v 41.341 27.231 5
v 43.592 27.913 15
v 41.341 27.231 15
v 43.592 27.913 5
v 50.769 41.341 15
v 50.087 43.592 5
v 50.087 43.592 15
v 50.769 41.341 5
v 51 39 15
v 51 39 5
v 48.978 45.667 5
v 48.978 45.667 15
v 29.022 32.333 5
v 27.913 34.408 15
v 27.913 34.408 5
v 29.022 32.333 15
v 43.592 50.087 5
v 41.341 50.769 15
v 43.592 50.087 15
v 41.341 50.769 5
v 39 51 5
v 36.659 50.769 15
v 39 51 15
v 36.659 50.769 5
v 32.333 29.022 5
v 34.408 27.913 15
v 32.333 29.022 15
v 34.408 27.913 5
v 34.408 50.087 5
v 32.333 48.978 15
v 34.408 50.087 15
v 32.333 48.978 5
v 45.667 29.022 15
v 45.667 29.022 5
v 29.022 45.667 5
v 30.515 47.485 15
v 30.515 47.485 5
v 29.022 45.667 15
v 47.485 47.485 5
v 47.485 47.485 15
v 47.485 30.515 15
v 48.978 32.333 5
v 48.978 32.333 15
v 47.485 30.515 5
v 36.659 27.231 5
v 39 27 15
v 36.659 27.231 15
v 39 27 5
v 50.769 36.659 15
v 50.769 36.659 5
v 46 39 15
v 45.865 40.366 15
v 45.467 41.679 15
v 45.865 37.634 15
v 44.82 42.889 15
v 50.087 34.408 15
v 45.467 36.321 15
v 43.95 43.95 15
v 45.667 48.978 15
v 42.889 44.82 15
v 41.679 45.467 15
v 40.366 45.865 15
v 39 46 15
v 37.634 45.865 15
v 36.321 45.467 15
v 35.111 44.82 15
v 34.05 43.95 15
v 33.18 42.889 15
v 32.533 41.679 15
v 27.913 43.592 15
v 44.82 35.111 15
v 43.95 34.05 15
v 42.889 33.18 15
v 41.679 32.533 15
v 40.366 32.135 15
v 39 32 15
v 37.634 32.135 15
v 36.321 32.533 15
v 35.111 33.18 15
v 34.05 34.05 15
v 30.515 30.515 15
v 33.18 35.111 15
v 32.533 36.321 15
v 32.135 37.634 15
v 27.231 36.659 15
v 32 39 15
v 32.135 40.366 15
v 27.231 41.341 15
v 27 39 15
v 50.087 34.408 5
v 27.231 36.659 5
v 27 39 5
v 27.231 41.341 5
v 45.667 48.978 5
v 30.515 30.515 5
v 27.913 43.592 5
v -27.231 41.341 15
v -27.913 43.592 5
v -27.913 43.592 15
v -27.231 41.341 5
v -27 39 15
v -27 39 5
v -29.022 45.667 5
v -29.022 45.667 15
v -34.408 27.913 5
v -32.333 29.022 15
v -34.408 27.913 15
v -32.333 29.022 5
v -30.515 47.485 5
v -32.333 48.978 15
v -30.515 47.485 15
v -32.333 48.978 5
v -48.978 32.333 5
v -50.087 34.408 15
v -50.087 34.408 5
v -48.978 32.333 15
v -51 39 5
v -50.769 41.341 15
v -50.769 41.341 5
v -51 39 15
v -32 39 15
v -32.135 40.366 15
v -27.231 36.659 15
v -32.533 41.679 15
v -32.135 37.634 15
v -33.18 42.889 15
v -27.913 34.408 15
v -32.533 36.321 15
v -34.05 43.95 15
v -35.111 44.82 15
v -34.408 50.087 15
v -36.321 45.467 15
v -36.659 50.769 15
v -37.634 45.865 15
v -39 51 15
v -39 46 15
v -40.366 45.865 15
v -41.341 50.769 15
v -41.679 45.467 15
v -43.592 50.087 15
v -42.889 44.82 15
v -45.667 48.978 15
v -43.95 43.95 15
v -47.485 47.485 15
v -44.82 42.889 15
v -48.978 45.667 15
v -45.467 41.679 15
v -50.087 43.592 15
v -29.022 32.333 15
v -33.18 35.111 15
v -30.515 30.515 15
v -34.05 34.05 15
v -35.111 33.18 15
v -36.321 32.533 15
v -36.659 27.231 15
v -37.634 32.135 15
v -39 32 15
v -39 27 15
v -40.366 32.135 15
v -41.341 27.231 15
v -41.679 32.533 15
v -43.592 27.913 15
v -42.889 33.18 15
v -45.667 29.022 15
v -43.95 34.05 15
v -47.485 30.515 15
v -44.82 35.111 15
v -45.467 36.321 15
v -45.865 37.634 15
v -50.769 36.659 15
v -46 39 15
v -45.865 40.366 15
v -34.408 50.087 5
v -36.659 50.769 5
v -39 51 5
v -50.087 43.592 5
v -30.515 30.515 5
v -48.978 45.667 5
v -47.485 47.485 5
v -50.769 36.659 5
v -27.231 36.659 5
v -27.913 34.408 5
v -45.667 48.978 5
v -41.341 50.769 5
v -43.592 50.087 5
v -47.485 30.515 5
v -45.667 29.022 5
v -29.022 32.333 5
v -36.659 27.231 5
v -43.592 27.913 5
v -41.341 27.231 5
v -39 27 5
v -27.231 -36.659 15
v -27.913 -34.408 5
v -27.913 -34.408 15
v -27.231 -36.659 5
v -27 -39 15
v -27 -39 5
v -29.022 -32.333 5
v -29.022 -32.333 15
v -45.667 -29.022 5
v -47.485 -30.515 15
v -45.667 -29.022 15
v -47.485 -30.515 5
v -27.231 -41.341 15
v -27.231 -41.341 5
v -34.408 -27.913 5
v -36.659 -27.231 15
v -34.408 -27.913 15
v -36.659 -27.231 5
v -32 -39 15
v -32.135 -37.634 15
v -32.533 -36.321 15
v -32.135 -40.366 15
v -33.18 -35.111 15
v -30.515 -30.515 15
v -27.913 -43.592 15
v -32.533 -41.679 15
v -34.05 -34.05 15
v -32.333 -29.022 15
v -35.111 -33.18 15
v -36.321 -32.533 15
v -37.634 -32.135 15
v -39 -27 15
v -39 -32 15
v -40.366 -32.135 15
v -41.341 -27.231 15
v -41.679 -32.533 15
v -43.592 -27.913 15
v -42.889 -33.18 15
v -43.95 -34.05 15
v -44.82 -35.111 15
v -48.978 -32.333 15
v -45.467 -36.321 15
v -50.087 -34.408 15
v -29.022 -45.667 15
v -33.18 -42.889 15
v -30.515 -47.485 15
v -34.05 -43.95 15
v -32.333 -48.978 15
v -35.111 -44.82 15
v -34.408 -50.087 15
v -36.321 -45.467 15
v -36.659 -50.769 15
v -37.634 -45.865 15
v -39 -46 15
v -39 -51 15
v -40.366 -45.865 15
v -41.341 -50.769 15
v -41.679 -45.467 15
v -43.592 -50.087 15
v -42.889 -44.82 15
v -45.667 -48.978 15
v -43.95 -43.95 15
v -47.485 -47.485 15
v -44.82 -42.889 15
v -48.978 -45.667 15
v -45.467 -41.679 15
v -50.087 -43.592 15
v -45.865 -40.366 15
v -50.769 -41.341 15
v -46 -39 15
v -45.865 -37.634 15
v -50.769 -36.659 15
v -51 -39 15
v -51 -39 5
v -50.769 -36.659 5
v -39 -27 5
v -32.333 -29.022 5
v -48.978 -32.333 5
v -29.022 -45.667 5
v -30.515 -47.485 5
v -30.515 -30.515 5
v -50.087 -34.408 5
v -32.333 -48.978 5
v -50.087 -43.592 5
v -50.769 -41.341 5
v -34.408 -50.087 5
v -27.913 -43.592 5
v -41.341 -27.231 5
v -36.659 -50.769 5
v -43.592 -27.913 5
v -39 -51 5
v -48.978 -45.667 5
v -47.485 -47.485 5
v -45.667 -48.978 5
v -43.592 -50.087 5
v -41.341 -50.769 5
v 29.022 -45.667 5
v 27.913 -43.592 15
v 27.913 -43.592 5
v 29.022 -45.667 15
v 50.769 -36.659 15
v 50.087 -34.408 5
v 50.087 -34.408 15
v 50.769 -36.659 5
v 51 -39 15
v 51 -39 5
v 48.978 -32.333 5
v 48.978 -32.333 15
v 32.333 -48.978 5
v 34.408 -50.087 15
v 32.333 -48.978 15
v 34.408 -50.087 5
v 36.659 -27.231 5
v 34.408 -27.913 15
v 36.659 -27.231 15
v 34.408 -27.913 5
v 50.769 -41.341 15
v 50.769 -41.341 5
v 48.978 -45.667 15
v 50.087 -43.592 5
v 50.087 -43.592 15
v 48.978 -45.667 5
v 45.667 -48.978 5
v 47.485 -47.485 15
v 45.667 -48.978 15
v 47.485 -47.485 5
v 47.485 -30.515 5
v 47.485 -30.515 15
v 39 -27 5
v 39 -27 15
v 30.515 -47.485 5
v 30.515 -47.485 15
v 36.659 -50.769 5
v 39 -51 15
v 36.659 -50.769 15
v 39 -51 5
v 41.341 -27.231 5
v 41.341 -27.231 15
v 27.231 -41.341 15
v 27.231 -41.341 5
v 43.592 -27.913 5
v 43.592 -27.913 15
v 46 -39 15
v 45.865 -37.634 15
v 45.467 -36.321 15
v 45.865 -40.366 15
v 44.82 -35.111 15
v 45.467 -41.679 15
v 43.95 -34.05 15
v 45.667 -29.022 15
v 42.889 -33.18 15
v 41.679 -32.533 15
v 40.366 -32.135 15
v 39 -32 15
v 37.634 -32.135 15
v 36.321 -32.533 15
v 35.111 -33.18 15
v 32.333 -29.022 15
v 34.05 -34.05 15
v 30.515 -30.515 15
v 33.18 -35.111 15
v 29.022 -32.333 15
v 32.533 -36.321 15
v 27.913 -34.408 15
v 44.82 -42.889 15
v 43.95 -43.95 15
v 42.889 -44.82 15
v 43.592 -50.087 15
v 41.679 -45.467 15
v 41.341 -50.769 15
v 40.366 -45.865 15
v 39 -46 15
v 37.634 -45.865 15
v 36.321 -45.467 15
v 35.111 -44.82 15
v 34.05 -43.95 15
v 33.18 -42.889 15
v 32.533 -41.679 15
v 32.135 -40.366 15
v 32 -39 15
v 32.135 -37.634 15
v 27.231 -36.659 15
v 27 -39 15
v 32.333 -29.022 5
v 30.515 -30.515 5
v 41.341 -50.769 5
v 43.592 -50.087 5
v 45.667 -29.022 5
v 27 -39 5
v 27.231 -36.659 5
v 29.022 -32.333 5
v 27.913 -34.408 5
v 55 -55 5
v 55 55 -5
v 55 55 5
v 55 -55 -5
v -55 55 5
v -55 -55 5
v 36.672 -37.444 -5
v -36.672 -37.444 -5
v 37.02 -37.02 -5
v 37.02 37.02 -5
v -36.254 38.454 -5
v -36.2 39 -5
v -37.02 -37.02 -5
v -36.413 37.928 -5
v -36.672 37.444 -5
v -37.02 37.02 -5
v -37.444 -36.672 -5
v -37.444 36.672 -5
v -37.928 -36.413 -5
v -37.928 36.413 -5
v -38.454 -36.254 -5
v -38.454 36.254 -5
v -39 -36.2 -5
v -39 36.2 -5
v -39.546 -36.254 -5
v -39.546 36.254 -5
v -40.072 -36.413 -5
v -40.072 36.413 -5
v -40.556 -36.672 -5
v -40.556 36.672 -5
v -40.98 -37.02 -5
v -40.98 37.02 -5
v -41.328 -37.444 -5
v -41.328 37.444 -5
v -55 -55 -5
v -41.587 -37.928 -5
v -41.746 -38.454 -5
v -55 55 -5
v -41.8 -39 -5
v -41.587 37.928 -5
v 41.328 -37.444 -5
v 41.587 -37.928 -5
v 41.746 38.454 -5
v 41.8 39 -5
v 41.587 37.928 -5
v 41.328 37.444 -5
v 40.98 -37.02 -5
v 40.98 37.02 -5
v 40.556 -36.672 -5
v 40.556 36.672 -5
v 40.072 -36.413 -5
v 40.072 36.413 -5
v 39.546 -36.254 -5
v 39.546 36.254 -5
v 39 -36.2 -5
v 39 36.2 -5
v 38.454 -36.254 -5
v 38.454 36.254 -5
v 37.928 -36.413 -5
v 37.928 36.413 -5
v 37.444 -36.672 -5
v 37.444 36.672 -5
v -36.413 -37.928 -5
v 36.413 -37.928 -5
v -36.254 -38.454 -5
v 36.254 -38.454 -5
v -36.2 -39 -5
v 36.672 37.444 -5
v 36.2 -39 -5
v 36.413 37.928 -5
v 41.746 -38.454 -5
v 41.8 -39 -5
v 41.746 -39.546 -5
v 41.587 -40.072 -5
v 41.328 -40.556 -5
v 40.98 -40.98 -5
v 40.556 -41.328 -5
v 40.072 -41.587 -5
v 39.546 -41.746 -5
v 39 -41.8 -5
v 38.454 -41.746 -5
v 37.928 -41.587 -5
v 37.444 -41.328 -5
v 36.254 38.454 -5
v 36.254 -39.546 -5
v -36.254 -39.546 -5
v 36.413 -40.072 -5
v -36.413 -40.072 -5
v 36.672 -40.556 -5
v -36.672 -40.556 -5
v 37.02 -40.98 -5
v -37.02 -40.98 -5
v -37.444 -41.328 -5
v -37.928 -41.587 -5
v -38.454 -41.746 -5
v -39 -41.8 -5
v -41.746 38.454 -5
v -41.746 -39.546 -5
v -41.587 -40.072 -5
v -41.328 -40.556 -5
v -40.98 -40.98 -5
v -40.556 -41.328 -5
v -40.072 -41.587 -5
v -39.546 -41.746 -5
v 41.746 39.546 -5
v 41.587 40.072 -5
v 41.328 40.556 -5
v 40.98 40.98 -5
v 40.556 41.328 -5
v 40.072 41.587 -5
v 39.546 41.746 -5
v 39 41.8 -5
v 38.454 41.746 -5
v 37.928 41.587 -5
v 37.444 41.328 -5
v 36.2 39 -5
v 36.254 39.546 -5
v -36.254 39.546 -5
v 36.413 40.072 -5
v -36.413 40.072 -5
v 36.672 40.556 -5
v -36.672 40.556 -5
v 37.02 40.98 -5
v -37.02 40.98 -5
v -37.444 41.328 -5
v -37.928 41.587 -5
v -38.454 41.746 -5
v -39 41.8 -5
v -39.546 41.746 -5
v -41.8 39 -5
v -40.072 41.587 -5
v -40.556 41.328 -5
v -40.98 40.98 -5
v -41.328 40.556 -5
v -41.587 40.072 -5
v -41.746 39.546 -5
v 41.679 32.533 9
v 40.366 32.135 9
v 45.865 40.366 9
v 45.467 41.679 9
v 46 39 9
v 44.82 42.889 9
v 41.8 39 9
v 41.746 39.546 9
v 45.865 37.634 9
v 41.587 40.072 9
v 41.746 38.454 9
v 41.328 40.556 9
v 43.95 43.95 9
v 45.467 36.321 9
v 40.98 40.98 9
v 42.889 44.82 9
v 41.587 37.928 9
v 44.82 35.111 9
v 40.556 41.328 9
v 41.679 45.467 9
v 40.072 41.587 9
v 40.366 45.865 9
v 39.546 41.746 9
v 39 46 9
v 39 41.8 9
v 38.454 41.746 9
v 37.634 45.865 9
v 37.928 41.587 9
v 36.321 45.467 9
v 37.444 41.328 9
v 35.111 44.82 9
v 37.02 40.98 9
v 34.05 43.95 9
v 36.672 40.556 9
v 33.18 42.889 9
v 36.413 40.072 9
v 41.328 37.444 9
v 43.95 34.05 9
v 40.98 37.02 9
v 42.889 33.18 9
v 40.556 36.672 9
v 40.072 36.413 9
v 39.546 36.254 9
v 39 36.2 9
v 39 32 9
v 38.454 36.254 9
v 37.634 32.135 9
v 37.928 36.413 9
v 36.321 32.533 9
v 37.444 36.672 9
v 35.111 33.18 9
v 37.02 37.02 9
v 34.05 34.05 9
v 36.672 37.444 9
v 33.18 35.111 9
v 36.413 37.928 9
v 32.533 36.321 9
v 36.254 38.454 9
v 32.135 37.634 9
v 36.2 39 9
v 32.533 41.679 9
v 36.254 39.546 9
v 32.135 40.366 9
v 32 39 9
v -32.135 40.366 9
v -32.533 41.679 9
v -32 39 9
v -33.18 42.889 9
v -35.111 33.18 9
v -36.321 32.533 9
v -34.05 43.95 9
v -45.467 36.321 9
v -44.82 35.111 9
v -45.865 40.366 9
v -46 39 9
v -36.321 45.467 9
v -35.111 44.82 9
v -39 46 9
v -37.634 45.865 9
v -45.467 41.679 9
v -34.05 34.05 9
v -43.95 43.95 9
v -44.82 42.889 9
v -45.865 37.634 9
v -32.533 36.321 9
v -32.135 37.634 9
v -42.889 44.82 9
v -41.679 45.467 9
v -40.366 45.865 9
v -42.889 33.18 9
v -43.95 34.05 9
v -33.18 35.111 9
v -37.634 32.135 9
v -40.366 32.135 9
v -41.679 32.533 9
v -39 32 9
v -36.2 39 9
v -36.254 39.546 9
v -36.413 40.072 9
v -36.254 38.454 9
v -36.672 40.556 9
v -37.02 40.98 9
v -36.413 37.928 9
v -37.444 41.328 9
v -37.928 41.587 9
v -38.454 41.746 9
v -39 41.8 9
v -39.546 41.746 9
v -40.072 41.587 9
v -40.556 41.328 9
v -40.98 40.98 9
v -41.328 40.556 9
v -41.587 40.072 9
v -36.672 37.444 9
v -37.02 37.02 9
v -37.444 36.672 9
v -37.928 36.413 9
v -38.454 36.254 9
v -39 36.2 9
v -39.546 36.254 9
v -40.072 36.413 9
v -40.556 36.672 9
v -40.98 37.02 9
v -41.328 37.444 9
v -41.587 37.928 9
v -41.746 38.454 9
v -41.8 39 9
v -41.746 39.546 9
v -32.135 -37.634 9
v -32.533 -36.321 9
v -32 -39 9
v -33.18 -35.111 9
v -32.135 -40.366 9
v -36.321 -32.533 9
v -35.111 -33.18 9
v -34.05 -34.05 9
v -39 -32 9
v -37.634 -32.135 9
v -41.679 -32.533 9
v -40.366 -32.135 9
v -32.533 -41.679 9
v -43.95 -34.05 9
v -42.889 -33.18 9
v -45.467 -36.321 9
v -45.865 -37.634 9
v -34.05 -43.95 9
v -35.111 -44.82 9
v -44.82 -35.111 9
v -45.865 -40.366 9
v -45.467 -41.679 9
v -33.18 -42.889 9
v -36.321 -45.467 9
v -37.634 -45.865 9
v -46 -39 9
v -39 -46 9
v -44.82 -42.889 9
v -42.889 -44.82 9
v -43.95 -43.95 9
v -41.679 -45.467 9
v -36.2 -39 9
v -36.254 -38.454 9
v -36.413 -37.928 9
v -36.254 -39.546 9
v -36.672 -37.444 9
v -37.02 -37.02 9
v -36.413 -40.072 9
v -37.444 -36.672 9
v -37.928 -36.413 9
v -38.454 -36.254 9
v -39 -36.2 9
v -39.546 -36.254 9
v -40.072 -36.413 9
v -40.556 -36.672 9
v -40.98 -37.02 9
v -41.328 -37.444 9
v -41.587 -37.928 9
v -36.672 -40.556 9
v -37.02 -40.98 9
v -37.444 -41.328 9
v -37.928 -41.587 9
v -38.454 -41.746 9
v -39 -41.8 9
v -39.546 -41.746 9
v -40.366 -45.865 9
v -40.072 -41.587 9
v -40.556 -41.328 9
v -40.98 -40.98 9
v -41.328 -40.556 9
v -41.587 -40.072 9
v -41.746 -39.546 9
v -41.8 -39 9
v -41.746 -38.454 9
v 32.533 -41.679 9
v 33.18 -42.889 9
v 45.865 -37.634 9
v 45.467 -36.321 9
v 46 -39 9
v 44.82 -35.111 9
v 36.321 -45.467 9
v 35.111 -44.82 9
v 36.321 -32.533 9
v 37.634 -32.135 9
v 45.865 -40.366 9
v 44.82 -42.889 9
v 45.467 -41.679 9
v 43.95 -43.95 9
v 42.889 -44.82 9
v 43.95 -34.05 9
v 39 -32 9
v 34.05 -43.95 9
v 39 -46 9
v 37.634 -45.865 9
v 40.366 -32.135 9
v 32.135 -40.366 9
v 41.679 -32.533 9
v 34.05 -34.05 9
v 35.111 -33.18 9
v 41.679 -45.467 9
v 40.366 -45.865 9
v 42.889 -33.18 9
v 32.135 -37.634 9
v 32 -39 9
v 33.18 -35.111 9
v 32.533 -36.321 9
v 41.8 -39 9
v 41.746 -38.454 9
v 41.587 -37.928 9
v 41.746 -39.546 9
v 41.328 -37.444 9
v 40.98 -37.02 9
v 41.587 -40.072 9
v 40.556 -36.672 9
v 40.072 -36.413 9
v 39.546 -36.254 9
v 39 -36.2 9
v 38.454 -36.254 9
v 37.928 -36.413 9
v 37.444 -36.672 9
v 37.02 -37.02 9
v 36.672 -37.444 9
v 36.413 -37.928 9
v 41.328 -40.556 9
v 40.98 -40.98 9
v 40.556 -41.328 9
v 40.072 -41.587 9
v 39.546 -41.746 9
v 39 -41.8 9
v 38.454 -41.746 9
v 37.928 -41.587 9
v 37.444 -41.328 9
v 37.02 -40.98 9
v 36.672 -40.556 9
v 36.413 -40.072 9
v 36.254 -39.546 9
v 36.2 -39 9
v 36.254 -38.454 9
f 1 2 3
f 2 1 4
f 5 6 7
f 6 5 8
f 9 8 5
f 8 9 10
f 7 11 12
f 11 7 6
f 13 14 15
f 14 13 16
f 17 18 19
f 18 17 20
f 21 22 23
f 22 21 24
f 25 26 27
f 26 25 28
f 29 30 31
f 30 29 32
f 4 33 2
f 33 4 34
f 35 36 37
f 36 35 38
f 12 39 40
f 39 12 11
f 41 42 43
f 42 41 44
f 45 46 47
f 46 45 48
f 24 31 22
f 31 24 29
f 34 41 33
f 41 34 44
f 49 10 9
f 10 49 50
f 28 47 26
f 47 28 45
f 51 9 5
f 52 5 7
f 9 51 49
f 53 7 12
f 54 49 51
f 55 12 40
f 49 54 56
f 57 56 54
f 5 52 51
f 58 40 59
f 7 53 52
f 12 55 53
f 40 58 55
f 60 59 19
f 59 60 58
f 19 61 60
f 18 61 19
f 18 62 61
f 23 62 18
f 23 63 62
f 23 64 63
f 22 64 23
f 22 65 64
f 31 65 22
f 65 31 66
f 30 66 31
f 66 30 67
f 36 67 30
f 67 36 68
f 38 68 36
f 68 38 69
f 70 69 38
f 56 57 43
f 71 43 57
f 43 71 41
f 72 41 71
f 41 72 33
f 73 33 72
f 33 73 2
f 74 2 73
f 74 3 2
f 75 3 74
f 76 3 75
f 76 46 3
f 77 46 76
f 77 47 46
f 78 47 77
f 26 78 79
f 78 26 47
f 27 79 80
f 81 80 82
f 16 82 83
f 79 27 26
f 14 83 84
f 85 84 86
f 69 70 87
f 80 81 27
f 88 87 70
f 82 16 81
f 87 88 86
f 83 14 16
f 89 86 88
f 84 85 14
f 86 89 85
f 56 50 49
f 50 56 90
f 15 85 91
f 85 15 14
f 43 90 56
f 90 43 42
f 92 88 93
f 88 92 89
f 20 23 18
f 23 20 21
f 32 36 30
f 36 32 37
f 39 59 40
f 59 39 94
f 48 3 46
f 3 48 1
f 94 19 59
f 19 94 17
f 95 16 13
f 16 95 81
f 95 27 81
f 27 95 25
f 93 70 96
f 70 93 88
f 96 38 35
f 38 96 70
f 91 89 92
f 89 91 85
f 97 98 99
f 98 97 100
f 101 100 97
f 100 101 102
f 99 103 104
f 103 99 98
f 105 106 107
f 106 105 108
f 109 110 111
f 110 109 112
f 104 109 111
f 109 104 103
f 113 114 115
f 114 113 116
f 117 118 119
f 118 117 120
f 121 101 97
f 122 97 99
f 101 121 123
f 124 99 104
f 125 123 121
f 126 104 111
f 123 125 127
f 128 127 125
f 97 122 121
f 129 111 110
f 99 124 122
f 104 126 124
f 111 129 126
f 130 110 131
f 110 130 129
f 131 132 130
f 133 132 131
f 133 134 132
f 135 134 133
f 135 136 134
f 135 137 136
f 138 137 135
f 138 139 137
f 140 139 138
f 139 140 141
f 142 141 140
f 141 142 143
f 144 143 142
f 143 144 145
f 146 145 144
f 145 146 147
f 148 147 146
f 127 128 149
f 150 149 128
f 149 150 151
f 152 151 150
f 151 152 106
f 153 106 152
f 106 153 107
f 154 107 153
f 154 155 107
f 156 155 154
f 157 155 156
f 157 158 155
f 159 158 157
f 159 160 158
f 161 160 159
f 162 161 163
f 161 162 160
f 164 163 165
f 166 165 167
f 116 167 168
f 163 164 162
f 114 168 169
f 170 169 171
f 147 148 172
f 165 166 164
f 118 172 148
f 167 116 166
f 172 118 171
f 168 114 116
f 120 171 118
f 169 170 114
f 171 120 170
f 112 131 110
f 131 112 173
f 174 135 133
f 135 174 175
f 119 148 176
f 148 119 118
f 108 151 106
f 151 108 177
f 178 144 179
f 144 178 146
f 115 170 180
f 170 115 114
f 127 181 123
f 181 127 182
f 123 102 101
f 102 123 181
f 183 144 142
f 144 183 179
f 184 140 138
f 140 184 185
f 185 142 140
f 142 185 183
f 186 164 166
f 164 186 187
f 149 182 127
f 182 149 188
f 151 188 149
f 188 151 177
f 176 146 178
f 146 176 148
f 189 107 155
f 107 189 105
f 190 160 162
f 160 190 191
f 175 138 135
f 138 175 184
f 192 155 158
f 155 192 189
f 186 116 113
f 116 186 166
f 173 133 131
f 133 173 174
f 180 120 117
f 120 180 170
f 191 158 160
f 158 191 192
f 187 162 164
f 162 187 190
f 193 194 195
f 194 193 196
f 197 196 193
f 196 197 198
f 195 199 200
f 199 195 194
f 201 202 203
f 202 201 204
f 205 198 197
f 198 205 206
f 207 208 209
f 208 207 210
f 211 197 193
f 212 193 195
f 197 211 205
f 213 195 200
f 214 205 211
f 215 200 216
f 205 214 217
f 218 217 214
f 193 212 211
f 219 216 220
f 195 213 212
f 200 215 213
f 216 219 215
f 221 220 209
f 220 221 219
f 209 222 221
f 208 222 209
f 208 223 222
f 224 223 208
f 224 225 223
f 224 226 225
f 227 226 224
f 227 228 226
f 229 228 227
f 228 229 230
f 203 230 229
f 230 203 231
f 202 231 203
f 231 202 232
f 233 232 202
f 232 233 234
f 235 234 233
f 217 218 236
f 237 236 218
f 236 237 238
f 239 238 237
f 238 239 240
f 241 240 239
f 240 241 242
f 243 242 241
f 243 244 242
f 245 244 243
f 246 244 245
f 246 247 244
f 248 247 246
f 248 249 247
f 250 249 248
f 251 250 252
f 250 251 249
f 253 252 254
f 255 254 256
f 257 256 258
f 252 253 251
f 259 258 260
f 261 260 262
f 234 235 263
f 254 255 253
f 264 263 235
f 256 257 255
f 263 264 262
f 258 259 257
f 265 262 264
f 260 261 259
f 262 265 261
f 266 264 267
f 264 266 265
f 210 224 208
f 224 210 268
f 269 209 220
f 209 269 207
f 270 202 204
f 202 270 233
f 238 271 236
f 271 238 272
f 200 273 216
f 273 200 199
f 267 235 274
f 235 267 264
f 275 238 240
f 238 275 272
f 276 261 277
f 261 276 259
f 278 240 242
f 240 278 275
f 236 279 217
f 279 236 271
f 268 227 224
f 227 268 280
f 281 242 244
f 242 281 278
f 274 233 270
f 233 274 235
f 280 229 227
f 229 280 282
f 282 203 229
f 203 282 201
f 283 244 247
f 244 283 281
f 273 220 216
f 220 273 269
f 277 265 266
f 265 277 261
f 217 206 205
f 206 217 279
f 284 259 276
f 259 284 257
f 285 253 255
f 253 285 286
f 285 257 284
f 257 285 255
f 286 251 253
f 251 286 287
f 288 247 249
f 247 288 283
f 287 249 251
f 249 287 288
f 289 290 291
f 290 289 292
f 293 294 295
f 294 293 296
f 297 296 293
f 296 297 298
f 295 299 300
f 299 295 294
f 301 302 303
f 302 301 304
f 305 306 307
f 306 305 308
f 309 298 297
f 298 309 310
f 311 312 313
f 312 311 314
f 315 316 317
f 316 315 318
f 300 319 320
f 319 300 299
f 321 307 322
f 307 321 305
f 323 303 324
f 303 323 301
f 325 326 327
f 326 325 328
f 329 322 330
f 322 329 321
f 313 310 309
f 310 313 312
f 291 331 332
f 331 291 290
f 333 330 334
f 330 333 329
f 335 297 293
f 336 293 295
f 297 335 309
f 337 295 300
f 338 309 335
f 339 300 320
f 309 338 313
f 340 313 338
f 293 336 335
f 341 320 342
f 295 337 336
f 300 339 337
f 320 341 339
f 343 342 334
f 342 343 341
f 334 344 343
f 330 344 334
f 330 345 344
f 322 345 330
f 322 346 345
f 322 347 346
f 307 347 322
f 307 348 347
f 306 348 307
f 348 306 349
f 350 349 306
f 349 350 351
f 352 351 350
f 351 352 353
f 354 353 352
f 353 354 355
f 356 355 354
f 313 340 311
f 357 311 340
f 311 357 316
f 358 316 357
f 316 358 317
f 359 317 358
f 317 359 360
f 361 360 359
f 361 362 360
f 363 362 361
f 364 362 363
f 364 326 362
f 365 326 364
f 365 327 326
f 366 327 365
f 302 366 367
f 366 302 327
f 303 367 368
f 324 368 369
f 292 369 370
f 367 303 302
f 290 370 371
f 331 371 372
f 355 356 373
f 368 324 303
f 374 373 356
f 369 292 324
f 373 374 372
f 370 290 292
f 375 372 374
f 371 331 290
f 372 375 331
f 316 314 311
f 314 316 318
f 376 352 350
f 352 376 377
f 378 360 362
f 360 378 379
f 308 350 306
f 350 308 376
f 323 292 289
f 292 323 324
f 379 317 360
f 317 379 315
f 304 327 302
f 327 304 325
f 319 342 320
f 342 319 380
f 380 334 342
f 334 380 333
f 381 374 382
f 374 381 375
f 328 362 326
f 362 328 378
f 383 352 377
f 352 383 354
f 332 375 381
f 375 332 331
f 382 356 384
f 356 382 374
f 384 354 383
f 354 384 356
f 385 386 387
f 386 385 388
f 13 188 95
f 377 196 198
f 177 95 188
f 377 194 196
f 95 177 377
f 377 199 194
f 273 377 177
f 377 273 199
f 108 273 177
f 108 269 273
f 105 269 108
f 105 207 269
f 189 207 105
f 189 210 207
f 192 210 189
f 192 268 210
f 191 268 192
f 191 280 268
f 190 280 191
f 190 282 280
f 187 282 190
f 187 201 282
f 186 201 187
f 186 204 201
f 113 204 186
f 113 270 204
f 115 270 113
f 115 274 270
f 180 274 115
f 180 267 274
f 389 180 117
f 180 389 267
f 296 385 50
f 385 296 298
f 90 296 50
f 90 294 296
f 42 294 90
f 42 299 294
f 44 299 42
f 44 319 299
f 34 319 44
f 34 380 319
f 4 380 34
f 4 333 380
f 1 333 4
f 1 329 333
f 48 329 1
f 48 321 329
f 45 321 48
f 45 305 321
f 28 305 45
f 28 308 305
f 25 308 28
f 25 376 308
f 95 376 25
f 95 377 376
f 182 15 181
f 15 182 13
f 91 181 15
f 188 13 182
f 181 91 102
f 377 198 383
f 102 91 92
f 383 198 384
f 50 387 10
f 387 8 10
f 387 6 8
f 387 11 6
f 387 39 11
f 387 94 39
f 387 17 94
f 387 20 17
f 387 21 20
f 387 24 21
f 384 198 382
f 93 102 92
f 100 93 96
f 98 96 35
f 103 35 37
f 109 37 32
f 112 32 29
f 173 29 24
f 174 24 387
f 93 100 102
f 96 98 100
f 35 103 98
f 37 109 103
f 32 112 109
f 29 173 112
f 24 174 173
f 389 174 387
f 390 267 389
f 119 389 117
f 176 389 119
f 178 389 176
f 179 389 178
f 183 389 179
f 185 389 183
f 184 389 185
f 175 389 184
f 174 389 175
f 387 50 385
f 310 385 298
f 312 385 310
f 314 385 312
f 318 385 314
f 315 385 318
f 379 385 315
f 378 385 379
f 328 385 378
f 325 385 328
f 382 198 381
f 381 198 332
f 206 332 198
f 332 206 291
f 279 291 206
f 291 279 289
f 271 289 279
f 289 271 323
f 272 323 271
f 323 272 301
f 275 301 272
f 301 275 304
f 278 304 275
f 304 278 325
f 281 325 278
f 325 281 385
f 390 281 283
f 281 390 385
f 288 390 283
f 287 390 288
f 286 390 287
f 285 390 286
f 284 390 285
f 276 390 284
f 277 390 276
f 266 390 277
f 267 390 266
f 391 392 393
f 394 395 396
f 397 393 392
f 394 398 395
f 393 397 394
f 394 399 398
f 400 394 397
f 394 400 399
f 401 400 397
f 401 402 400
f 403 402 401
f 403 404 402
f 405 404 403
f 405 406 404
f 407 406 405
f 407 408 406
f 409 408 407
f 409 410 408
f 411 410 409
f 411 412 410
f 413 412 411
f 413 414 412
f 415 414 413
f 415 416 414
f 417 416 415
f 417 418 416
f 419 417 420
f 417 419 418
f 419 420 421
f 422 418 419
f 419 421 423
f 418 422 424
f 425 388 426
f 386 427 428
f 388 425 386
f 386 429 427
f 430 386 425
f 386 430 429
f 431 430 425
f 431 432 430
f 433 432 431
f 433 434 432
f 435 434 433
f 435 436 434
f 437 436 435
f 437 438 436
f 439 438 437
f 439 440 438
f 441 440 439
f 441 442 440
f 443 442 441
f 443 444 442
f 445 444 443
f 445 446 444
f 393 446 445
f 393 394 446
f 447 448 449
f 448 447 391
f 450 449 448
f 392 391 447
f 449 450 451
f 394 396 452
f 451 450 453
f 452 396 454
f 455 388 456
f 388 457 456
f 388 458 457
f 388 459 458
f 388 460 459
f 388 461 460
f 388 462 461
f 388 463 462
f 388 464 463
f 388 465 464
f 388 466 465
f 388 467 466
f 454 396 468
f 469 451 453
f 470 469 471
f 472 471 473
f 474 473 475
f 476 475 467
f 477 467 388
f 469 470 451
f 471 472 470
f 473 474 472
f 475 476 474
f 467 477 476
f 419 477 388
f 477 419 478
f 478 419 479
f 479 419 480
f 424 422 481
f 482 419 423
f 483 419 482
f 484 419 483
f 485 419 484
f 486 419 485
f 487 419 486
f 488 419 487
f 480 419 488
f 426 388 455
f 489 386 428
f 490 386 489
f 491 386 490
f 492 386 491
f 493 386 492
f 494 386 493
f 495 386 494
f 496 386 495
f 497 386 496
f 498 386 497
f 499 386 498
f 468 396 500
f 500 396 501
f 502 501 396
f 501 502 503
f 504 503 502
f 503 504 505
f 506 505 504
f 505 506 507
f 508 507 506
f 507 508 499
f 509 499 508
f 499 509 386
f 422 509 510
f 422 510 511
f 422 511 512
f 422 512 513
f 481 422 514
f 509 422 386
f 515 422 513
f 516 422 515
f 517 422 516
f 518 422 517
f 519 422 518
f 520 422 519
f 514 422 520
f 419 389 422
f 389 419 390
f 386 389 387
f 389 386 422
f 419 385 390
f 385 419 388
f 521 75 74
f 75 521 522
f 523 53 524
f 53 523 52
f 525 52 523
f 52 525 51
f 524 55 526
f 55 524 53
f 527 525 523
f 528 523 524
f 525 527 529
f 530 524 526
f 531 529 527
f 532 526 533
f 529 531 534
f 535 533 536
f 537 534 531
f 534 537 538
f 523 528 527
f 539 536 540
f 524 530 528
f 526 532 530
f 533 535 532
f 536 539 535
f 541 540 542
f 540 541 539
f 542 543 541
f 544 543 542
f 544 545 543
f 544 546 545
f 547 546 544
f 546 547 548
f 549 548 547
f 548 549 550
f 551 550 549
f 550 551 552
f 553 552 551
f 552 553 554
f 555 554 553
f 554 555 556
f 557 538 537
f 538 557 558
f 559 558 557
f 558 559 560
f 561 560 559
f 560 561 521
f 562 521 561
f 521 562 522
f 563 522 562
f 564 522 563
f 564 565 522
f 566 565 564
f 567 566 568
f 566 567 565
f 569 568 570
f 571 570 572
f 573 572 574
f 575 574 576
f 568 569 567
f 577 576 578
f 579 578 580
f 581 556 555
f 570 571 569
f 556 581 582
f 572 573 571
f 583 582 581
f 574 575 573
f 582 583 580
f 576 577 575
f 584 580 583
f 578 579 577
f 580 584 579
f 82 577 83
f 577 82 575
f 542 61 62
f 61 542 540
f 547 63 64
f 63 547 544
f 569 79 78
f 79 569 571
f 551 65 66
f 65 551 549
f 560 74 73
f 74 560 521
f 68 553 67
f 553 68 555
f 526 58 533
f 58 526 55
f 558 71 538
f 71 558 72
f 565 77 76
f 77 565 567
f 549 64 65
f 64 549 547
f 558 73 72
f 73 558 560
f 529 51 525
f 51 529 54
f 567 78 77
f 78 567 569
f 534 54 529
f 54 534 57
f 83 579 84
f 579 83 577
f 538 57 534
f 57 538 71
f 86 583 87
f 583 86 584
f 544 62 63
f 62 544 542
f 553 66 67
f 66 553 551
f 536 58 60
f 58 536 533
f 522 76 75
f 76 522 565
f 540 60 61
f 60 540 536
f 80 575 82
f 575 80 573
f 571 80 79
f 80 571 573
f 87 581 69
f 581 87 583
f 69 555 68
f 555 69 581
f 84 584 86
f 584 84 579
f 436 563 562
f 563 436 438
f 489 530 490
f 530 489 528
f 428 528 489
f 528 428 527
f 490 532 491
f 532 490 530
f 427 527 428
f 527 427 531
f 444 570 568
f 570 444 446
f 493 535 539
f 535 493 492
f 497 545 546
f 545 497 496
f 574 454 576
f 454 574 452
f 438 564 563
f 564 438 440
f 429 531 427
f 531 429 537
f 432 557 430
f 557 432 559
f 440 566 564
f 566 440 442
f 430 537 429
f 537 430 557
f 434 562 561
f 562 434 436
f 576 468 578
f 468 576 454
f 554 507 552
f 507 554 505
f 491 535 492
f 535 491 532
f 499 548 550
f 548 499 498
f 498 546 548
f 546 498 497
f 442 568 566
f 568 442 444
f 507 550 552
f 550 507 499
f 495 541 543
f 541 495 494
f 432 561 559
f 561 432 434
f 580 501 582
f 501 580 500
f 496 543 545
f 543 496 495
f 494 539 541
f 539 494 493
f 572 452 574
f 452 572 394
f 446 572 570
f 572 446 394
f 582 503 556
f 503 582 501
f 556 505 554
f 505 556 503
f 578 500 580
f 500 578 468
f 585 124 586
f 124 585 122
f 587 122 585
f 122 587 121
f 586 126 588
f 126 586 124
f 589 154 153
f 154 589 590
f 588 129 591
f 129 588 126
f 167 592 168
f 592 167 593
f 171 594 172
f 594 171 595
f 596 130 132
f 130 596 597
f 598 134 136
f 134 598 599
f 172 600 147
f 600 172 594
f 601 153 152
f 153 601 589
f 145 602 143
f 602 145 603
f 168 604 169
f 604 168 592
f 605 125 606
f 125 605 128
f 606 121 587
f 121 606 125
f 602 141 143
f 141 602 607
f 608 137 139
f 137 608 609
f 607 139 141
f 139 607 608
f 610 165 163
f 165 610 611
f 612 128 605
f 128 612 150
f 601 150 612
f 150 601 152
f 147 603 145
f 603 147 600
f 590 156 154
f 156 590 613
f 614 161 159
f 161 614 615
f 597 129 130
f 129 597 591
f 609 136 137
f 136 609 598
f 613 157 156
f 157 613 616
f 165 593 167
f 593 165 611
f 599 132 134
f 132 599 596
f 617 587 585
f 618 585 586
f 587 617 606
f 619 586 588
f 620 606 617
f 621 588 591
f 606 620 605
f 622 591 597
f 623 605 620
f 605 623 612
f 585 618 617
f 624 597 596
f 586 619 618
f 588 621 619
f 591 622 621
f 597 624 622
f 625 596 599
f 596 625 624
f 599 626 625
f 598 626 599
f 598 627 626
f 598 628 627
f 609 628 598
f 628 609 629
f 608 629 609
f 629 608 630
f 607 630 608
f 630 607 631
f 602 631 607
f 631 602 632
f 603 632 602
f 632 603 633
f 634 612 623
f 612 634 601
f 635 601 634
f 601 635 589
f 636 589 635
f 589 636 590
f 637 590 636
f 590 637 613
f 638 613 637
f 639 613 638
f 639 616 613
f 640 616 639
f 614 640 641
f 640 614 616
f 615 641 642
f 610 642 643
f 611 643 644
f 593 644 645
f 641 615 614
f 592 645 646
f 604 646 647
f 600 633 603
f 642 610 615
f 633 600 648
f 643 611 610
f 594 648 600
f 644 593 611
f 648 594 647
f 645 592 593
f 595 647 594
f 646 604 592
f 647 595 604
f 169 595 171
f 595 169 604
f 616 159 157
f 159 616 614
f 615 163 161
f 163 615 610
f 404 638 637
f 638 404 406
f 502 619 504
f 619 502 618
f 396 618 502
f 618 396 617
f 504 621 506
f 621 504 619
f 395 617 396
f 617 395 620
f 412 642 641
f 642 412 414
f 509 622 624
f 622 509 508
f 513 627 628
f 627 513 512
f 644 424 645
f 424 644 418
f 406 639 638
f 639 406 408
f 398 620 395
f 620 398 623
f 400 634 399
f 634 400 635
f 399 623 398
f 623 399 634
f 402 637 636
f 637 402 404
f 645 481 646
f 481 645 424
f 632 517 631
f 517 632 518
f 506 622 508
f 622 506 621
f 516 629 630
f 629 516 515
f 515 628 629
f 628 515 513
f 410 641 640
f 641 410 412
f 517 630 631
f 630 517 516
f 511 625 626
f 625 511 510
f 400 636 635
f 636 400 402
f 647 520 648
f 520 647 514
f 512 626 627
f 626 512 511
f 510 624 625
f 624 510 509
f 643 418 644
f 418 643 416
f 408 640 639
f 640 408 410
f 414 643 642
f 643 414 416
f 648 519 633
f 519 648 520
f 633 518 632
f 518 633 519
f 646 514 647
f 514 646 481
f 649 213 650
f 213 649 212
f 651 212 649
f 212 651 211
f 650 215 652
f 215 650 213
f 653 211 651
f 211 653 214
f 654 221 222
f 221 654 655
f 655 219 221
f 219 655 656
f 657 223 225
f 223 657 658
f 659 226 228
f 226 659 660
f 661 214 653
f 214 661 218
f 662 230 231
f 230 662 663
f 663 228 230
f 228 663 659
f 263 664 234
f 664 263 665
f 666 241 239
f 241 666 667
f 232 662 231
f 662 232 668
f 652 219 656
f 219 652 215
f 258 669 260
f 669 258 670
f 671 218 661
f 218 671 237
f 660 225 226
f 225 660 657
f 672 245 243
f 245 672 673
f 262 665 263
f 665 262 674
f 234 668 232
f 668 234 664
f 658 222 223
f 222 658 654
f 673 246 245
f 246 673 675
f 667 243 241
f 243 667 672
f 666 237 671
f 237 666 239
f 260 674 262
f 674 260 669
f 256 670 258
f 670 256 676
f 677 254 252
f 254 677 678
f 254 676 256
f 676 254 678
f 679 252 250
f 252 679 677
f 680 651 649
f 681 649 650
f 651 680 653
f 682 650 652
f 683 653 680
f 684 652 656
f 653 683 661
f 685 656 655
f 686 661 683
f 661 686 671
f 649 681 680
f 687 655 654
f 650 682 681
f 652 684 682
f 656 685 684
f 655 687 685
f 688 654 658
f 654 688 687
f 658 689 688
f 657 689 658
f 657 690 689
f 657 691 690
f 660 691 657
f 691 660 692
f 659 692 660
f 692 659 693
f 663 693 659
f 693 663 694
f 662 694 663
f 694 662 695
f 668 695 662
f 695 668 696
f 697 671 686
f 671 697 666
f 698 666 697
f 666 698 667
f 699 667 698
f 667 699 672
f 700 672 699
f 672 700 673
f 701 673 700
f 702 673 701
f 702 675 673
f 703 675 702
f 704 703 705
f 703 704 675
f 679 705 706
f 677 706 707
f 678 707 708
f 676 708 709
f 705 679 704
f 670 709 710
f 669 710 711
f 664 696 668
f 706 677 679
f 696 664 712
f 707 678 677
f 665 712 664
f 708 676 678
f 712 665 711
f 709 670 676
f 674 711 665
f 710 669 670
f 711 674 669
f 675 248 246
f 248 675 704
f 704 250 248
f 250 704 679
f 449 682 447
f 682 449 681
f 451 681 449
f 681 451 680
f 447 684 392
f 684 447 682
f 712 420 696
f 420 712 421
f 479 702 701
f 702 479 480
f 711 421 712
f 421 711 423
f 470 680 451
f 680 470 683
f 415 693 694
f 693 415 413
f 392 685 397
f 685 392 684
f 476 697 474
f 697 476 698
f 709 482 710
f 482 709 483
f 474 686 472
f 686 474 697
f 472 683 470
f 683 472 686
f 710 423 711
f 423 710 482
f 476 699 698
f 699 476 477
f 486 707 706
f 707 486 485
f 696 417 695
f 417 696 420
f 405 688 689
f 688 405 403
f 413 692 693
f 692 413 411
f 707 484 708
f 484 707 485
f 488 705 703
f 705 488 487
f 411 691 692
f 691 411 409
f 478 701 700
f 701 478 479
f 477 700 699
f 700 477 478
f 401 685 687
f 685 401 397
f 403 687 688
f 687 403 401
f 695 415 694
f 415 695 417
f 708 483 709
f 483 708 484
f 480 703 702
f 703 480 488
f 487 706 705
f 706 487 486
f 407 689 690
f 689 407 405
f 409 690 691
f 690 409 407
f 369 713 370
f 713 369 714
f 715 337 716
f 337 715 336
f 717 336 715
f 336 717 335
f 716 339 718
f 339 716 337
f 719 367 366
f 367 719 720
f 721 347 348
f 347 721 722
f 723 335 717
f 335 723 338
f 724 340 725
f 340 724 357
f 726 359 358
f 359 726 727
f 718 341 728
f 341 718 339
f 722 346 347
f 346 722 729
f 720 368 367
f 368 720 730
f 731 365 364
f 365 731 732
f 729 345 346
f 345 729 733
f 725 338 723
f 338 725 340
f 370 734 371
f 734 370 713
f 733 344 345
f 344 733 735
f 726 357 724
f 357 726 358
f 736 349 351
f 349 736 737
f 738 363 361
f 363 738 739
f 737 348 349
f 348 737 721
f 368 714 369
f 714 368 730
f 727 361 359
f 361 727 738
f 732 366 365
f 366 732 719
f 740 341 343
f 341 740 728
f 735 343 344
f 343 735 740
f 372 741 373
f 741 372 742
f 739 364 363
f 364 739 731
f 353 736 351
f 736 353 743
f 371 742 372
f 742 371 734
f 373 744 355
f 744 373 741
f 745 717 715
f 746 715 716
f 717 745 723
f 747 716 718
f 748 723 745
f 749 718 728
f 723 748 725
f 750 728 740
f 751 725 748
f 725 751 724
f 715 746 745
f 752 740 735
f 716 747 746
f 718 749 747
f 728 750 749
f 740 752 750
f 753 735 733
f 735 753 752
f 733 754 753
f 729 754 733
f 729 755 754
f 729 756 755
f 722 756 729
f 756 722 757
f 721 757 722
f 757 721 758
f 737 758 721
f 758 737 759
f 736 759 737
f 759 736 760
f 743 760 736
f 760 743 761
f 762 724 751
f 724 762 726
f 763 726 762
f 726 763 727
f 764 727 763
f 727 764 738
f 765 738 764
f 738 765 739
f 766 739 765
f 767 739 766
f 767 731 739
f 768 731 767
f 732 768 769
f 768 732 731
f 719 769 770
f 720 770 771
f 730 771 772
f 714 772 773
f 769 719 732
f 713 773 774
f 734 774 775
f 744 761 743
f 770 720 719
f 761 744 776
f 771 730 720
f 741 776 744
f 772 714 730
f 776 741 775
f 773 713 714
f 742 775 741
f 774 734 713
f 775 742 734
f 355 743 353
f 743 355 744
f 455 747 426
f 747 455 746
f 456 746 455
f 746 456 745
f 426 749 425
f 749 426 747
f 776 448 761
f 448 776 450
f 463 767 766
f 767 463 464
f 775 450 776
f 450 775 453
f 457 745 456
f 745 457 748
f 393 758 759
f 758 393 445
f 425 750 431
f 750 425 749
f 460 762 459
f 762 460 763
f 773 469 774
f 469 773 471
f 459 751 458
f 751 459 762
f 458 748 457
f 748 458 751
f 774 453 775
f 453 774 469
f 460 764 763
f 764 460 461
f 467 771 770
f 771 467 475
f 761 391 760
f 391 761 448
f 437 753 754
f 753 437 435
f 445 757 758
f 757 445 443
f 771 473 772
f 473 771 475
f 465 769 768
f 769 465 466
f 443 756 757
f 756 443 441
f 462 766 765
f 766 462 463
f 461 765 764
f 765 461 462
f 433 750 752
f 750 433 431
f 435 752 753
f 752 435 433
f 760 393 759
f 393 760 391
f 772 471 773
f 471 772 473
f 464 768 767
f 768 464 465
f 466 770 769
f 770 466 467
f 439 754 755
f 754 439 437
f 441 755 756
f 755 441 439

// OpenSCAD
$fn = 32;

// ----------------------------------------------------------------------
// Socket pad plate
// bosses with counterbored sockets for the screws
// ----------------------------------------------------------------------

// --- parameters (mm) ---
base_t = 10;             // base plate thickness
boss_h = 10;             // boss height above the base plate
boss_d = 24;             // boss diameter
socket_d = 14;           // socket diameter
socket_depth = 6;        // socket depth from the boss face
bolt_d = 5.6;            // screw clearance hole through the socket floor
plate = [110, 110, 10];  // overall size (x, y, z)
edge = 16;               // boss centre offset from the plate edge
pads = 4;                // boss count, one per corner

// --- derived feature positions (mm) ---
height = base_t + boss_h;        // = 20   overall height of the part
corner_x = plate[0] / 2 - edge;  // = 39   boss centre X
corner_y = plate[1] / 2 - edge;  // = 39   boss centre Y
feature_centers = [
  [corner_x, corner_y],
  [-corner_x, corner_y],
  [-corner_x, -corner_y],
  [corner_x, -corner_y]
];   // boss centres: sockets, holes and the pads themselves are placed from here

// base plate, bosses on feature_centers, socket + through hole in each
difference() {
  union() {
    cube(plate, center = true);
    for (centre = feature_centers)
      translate([centre[0], centre[1], plate[2] / 2 - 1])
        cylinder(d = boss_d, h = boss_h + 1);
  }
  for (centre = feature_centers) {
    translate([centre[0], centre[1], plate[2] / 2 + boss_h - socket_depth])
      cylinder(d = socket_d, h = socket_depth + 1);
    translate([centre[0], centre[1], -height])
      cylinder(d = bolt_d, h = 2 * height + 2);  // through the socket floor
  }
}
